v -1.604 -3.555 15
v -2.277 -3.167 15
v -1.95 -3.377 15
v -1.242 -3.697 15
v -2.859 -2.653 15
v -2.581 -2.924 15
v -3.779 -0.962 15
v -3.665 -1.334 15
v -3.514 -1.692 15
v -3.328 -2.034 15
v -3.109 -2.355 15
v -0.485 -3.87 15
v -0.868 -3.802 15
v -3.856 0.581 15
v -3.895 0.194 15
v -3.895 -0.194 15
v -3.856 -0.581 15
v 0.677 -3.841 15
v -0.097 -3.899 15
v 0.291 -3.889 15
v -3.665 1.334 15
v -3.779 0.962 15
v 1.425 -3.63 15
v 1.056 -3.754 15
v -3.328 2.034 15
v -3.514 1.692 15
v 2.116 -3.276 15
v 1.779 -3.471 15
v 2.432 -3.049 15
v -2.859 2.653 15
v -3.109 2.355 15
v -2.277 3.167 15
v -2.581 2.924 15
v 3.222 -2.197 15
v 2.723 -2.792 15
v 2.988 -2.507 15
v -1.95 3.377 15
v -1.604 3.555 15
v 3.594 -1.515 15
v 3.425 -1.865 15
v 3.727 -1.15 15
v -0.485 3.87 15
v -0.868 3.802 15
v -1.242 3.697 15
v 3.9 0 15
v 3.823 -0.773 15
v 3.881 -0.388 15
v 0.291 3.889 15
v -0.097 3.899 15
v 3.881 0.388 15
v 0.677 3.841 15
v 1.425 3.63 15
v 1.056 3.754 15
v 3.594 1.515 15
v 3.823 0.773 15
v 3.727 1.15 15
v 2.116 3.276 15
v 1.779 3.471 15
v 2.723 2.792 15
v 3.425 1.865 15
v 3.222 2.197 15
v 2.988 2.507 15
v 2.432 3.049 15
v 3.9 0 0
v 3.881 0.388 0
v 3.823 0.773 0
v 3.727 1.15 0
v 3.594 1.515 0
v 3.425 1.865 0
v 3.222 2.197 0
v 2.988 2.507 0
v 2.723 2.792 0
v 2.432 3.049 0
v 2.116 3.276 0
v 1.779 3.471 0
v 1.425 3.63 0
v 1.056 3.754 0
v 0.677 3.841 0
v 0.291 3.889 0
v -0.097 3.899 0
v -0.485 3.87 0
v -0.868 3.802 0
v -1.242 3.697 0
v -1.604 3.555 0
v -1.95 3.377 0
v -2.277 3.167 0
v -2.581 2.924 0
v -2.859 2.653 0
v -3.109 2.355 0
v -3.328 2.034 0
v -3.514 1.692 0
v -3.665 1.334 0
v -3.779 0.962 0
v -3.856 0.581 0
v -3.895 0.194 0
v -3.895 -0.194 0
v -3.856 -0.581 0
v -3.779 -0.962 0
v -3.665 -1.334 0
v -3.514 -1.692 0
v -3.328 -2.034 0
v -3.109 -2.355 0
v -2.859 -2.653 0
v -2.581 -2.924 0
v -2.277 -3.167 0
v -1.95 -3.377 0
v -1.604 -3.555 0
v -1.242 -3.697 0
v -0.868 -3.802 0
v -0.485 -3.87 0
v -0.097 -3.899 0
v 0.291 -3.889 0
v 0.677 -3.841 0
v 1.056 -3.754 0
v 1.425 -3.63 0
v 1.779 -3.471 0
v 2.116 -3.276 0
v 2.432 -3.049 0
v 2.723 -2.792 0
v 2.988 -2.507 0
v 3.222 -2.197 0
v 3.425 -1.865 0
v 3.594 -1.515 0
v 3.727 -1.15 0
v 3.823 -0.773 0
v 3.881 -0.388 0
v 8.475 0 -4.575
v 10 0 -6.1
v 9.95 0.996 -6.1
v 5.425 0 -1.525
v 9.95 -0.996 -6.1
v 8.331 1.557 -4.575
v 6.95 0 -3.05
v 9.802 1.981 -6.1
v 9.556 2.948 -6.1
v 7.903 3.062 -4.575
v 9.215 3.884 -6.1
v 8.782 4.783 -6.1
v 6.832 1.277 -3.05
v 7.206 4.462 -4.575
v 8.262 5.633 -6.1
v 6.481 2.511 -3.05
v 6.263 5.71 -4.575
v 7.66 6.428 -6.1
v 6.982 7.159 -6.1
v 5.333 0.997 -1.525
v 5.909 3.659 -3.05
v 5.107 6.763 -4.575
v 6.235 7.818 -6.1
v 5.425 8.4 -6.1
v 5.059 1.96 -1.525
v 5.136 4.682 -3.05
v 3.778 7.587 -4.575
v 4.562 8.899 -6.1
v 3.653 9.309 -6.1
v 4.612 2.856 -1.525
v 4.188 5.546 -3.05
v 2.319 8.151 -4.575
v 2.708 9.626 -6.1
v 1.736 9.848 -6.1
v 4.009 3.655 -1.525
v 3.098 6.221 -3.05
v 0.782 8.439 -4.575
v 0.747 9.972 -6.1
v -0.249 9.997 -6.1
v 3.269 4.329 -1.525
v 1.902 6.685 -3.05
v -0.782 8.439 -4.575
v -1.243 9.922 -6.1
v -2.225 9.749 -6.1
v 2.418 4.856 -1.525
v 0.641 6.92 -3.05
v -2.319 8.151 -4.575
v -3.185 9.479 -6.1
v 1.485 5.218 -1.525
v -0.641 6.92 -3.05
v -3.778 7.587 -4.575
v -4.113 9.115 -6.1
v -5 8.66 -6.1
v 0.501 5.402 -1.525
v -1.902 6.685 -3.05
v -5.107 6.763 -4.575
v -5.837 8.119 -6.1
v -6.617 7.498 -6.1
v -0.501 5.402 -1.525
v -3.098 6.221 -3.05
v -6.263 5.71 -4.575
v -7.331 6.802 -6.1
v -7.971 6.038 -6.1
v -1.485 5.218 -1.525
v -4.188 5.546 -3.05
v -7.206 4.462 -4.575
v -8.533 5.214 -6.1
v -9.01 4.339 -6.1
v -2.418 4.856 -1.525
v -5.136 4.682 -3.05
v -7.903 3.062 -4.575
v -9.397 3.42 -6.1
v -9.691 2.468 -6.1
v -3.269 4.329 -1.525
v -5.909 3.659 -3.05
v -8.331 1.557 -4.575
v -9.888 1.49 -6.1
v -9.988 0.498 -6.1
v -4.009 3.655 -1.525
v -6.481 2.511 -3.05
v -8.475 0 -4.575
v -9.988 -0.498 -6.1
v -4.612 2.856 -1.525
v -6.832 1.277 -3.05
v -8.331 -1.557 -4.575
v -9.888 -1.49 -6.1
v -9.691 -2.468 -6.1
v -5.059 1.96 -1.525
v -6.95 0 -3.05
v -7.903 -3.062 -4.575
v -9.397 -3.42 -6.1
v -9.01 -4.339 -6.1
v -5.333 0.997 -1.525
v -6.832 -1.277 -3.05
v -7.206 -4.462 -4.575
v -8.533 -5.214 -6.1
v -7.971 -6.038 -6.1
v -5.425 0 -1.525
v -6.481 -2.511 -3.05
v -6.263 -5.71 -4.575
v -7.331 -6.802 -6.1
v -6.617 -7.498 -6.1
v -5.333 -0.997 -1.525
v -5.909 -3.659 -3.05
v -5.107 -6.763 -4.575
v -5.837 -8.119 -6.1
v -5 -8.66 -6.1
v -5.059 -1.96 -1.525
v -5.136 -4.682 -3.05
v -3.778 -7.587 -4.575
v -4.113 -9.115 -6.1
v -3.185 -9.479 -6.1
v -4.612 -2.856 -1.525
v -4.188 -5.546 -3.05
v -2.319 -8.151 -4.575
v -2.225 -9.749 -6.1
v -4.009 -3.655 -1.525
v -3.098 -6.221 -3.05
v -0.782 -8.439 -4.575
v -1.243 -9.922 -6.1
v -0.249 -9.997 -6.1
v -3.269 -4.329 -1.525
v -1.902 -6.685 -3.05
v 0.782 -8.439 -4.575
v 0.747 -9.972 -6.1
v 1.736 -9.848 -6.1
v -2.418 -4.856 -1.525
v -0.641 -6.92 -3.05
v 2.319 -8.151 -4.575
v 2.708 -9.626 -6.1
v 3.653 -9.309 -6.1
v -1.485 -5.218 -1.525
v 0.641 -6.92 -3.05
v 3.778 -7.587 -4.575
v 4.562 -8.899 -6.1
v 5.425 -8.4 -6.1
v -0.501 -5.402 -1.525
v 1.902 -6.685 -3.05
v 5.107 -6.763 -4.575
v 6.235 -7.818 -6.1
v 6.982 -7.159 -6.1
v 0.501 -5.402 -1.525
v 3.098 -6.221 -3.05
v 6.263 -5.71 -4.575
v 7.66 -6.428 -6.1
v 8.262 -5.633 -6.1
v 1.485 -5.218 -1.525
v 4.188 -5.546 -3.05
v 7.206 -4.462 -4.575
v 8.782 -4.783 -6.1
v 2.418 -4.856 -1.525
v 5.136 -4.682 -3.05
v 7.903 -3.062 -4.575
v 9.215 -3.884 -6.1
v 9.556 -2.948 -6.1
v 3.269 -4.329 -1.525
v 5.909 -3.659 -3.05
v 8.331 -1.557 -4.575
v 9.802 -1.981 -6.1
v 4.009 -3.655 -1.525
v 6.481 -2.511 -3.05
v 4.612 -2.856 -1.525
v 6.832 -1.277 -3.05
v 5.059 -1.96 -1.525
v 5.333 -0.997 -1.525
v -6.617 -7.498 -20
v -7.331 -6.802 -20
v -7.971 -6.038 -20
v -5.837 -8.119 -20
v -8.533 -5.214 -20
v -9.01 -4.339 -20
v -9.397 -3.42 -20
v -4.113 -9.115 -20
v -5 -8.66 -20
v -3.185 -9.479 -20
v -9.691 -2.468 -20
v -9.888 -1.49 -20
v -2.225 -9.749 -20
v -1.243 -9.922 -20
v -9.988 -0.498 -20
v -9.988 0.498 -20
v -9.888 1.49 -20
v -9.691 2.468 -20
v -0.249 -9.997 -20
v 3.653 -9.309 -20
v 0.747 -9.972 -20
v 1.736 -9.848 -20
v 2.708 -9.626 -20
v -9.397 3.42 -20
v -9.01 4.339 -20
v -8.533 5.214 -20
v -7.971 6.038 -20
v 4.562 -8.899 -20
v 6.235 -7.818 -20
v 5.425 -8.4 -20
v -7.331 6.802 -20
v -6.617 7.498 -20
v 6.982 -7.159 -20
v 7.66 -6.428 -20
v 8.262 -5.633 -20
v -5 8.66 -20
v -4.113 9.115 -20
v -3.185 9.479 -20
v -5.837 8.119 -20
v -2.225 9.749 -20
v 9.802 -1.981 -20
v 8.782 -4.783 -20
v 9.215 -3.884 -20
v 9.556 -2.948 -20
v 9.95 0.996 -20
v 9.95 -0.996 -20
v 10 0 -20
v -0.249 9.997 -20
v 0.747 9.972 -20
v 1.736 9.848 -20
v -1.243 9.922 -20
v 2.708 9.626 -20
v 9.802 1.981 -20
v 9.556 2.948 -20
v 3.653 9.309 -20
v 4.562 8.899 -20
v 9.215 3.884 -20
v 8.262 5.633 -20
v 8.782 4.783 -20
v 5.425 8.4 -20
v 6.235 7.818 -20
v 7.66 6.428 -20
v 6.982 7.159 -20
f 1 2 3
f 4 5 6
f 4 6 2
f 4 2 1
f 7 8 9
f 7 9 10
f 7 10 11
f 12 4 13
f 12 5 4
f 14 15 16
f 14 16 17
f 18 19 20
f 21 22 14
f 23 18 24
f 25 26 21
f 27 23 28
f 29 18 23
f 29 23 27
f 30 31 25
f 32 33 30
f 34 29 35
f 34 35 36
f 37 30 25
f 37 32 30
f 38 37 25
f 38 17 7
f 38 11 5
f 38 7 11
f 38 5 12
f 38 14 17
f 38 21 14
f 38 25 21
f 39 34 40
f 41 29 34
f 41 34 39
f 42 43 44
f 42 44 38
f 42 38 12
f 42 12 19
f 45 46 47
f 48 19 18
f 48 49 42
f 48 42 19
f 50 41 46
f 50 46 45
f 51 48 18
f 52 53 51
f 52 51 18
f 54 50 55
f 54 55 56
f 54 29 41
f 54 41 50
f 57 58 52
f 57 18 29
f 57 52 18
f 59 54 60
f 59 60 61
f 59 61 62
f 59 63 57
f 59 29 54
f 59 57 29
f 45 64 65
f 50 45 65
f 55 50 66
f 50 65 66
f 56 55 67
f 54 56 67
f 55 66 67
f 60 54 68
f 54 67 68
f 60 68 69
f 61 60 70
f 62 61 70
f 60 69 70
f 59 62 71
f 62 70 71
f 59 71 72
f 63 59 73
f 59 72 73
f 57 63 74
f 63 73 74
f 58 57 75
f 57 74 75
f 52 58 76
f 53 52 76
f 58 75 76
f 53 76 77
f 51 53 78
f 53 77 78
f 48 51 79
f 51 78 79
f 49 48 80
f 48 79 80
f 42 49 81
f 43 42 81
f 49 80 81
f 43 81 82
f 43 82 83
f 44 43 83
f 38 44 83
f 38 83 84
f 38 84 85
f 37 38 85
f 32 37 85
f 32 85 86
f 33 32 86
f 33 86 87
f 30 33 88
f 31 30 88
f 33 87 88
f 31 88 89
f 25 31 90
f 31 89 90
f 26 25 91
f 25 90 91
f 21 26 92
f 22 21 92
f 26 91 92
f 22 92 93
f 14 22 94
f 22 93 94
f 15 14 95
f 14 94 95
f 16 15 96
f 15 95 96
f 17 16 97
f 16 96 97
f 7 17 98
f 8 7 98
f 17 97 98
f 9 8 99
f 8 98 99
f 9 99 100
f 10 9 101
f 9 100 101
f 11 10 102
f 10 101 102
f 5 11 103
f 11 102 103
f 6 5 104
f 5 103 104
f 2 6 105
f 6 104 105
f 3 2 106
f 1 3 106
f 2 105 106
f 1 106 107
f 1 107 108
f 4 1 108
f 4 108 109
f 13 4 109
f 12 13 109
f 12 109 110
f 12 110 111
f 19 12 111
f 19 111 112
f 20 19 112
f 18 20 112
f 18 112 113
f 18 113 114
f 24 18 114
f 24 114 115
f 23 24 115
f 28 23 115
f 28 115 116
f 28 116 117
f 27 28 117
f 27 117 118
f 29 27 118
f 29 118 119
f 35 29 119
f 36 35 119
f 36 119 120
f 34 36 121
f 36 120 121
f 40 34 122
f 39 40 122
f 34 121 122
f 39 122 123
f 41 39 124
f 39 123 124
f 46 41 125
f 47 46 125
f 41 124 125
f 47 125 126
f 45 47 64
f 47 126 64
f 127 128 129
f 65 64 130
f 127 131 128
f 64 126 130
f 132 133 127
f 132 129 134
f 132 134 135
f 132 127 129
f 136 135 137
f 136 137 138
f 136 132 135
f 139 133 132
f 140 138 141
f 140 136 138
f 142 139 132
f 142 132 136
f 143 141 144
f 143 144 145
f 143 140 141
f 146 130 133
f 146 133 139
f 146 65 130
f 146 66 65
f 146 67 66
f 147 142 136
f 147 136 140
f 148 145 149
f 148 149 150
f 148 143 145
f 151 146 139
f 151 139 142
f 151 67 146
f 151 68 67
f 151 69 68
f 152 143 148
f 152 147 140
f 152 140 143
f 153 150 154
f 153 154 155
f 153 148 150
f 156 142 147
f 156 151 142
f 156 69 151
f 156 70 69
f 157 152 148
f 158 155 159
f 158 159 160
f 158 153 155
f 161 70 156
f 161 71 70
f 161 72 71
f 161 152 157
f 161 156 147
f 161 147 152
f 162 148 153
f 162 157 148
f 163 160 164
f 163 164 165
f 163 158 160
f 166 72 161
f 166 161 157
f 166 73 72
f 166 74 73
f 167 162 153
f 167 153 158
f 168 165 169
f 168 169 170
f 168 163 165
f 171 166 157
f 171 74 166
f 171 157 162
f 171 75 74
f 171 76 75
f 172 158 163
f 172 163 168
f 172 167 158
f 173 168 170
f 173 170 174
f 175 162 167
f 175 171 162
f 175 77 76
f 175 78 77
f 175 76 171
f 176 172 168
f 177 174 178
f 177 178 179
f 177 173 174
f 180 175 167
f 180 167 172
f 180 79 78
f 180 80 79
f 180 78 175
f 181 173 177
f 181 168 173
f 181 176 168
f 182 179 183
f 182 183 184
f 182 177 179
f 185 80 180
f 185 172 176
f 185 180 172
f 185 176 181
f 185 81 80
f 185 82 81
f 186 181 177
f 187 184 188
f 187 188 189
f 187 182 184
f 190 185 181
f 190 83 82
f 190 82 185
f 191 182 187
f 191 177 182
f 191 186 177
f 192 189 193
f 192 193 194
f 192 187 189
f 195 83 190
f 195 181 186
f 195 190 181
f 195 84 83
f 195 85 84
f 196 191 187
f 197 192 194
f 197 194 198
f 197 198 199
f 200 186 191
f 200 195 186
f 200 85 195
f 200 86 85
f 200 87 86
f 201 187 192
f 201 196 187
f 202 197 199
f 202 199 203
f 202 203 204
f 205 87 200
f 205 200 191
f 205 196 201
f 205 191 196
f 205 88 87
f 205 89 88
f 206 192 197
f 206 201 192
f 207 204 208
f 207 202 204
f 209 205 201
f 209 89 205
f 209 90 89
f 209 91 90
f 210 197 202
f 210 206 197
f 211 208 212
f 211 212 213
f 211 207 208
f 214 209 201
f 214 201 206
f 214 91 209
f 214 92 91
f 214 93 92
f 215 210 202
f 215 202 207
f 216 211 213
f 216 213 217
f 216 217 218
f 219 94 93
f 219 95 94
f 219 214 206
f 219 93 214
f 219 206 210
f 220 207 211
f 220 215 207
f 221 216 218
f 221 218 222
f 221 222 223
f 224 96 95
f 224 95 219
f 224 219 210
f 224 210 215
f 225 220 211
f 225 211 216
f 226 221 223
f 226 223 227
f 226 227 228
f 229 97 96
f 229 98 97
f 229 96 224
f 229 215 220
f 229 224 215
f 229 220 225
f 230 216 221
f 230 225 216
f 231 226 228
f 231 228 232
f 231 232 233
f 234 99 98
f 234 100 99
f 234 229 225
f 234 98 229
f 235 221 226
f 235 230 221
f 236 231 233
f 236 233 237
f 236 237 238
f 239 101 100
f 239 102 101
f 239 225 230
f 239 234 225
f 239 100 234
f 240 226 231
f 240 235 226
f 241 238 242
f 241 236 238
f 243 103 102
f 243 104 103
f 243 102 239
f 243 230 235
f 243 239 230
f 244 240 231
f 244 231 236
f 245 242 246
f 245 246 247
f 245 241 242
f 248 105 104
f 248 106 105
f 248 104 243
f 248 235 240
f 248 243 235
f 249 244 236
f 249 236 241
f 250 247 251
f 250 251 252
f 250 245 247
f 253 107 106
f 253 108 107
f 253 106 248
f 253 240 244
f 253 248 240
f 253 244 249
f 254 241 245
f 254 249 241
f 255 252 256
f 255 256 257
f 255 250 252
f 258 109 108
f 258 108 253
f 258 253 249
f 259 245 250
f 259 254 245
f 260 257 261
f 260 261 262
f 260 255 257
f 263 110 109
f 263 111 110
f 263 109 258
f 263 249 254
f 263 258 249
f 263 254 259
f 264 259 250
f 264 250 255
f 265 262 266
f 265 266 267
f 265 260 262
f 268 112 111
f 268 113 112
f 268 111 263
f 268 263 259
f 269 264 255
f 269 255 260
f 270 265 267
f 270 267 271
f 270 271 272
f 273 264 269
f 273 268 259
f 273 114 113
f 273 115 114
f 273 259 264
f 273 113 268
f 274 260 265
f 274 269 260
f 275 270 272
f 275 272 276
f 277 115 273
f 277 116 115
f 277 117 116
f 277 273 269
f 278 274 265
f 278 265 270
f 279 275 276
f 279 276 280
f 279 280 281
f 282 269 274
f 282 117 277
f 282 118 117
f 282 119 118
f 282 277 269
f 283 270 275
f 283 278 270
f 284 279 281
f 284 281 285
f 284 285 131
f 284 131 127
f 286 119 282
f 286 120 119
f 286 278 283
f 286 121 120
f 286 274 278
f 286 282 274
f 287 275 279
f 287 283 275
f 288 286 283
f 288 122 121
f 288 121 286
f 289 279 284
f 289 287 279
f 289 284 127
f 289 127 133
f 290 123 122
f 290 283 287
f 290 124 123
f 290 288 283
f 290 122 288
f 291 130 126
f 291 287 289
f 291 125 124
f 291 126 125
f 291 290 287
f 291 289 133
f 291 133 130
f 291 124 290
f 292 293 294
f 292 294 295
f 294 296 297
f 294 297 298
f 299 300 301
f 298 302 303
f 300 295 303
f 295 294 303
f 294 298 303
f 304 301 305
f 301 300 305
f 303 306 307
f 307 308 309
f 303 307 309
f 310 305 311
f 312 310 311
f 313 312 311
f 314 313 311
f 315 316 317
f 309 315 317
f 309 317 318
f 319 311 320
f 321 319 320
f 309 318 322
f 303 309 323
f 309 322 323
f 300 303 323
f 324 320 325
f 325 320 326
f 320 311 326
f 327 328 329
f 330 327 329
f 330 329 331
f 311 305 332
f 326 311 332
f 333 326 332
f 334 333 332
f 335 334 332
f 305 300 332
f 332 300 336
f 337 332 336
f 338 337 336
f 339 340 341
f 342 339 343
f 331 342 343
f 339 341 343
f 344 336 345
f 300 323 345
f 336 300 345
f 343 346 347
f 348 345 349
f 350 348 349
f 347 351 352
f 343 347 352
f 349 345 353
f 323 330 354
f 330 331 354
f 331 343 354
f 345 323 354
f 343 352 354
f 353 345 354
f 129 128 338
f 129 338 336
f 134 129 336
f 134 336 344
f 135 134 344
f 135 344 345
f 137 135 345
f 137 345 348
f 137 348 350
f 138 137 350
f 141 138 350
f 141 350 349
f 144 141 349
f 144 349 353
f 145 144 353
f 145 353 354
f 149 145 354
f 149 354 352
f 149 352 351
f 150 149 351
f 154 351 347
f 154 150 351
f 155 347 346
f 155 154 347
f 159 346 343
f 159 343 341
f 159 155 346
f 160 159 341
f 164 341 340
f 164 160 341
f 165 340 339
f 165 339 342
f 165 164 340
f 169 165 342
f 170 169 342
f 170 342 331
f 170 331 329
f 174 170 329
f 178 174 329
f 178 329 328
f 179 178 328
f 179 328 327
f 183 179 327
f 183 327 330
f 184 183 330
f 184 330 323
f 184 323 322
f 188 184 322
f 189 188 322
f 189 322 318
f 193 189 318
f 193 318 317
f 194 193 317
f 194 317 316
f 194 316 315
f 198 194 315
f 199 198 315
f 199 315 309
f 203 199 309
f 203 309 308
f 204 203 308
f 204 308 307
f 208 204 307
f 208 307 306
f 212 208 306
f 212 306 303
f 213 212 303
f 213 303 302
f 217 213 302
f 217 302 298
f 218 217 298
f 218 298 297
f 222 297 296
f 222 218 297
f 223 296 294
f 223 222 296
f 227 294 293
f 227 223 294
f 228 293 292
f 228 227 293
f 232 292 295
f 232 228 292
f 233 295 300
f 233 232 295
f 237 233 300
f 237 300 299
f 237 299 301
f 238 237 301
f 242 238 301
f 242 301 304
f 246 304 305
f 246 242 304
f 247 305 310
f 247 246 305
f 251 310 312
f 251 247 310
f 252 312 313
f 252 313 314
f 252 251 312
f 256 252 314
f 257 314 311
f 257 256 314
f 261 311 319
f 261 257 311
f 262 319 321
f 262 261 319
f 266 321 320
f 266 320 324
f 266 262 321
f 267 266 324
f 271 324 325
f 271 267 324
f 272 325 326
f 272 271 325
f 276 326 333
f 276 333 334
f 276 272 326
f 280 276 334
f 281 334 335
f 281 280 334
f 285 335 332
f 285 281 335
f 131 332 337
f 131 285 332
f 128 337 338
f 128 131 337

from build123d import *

# Parameters (mm, degrees)
F0_R        = 3.9
F1_DEPTH    = 15
F2_R        = 10
F3_DEPTH    = 20
F4_S5_R     = 3.9
F4_T6_DEPTH = 16


# Not quite as in the source:
# - a fillet or chamfer that OpenCascade refuses, or shapes differently, is made with other operations: its cross-section is extruded or revolved along the edge and cut away or added


with BuildPart() as f1:
    # F0 (on Top) → F1 (new body)
    with BuildSketch(Plane.XY):
        Circle(F0_R)
    extrude(amount=F1_DEPTH)

    # F2 (on Top) → F3 (join)
    with BuildSketch(Plane.XY):
        Circle(F2_R)
    extrude(amount=-F3_DEPTH)

    # F4: chamfer of 6.1 on 1 edges, made by hand


with BuildPart() as f4_tool2:
    # F4_s3 → F4_t4 (revolve)
    with BuildSketch(Plane.XZ):
        Polygon((10, -6.1), (3.9, 0), (10, 0), align=None)
    revolve(axis=Axis((0, 0, 0), (0, 0, 1)))

    # F4_s5 → F4_t6 (cut, symmetric)
    with BuildSketch(Plane.XY.offset(-3)):
        Circle(F4_S5_R)
    extrude(amount=F4_T6_DEPTH, both=True, mode=Mode.SUBTRACT)


with BuildPart() as f1_1:
    add(f1.part)

    # F4_t1: cut F4_tool2
    add(f4_tool2.part, mode=Mode.SUBTRACT)


solid = f1_1.part
